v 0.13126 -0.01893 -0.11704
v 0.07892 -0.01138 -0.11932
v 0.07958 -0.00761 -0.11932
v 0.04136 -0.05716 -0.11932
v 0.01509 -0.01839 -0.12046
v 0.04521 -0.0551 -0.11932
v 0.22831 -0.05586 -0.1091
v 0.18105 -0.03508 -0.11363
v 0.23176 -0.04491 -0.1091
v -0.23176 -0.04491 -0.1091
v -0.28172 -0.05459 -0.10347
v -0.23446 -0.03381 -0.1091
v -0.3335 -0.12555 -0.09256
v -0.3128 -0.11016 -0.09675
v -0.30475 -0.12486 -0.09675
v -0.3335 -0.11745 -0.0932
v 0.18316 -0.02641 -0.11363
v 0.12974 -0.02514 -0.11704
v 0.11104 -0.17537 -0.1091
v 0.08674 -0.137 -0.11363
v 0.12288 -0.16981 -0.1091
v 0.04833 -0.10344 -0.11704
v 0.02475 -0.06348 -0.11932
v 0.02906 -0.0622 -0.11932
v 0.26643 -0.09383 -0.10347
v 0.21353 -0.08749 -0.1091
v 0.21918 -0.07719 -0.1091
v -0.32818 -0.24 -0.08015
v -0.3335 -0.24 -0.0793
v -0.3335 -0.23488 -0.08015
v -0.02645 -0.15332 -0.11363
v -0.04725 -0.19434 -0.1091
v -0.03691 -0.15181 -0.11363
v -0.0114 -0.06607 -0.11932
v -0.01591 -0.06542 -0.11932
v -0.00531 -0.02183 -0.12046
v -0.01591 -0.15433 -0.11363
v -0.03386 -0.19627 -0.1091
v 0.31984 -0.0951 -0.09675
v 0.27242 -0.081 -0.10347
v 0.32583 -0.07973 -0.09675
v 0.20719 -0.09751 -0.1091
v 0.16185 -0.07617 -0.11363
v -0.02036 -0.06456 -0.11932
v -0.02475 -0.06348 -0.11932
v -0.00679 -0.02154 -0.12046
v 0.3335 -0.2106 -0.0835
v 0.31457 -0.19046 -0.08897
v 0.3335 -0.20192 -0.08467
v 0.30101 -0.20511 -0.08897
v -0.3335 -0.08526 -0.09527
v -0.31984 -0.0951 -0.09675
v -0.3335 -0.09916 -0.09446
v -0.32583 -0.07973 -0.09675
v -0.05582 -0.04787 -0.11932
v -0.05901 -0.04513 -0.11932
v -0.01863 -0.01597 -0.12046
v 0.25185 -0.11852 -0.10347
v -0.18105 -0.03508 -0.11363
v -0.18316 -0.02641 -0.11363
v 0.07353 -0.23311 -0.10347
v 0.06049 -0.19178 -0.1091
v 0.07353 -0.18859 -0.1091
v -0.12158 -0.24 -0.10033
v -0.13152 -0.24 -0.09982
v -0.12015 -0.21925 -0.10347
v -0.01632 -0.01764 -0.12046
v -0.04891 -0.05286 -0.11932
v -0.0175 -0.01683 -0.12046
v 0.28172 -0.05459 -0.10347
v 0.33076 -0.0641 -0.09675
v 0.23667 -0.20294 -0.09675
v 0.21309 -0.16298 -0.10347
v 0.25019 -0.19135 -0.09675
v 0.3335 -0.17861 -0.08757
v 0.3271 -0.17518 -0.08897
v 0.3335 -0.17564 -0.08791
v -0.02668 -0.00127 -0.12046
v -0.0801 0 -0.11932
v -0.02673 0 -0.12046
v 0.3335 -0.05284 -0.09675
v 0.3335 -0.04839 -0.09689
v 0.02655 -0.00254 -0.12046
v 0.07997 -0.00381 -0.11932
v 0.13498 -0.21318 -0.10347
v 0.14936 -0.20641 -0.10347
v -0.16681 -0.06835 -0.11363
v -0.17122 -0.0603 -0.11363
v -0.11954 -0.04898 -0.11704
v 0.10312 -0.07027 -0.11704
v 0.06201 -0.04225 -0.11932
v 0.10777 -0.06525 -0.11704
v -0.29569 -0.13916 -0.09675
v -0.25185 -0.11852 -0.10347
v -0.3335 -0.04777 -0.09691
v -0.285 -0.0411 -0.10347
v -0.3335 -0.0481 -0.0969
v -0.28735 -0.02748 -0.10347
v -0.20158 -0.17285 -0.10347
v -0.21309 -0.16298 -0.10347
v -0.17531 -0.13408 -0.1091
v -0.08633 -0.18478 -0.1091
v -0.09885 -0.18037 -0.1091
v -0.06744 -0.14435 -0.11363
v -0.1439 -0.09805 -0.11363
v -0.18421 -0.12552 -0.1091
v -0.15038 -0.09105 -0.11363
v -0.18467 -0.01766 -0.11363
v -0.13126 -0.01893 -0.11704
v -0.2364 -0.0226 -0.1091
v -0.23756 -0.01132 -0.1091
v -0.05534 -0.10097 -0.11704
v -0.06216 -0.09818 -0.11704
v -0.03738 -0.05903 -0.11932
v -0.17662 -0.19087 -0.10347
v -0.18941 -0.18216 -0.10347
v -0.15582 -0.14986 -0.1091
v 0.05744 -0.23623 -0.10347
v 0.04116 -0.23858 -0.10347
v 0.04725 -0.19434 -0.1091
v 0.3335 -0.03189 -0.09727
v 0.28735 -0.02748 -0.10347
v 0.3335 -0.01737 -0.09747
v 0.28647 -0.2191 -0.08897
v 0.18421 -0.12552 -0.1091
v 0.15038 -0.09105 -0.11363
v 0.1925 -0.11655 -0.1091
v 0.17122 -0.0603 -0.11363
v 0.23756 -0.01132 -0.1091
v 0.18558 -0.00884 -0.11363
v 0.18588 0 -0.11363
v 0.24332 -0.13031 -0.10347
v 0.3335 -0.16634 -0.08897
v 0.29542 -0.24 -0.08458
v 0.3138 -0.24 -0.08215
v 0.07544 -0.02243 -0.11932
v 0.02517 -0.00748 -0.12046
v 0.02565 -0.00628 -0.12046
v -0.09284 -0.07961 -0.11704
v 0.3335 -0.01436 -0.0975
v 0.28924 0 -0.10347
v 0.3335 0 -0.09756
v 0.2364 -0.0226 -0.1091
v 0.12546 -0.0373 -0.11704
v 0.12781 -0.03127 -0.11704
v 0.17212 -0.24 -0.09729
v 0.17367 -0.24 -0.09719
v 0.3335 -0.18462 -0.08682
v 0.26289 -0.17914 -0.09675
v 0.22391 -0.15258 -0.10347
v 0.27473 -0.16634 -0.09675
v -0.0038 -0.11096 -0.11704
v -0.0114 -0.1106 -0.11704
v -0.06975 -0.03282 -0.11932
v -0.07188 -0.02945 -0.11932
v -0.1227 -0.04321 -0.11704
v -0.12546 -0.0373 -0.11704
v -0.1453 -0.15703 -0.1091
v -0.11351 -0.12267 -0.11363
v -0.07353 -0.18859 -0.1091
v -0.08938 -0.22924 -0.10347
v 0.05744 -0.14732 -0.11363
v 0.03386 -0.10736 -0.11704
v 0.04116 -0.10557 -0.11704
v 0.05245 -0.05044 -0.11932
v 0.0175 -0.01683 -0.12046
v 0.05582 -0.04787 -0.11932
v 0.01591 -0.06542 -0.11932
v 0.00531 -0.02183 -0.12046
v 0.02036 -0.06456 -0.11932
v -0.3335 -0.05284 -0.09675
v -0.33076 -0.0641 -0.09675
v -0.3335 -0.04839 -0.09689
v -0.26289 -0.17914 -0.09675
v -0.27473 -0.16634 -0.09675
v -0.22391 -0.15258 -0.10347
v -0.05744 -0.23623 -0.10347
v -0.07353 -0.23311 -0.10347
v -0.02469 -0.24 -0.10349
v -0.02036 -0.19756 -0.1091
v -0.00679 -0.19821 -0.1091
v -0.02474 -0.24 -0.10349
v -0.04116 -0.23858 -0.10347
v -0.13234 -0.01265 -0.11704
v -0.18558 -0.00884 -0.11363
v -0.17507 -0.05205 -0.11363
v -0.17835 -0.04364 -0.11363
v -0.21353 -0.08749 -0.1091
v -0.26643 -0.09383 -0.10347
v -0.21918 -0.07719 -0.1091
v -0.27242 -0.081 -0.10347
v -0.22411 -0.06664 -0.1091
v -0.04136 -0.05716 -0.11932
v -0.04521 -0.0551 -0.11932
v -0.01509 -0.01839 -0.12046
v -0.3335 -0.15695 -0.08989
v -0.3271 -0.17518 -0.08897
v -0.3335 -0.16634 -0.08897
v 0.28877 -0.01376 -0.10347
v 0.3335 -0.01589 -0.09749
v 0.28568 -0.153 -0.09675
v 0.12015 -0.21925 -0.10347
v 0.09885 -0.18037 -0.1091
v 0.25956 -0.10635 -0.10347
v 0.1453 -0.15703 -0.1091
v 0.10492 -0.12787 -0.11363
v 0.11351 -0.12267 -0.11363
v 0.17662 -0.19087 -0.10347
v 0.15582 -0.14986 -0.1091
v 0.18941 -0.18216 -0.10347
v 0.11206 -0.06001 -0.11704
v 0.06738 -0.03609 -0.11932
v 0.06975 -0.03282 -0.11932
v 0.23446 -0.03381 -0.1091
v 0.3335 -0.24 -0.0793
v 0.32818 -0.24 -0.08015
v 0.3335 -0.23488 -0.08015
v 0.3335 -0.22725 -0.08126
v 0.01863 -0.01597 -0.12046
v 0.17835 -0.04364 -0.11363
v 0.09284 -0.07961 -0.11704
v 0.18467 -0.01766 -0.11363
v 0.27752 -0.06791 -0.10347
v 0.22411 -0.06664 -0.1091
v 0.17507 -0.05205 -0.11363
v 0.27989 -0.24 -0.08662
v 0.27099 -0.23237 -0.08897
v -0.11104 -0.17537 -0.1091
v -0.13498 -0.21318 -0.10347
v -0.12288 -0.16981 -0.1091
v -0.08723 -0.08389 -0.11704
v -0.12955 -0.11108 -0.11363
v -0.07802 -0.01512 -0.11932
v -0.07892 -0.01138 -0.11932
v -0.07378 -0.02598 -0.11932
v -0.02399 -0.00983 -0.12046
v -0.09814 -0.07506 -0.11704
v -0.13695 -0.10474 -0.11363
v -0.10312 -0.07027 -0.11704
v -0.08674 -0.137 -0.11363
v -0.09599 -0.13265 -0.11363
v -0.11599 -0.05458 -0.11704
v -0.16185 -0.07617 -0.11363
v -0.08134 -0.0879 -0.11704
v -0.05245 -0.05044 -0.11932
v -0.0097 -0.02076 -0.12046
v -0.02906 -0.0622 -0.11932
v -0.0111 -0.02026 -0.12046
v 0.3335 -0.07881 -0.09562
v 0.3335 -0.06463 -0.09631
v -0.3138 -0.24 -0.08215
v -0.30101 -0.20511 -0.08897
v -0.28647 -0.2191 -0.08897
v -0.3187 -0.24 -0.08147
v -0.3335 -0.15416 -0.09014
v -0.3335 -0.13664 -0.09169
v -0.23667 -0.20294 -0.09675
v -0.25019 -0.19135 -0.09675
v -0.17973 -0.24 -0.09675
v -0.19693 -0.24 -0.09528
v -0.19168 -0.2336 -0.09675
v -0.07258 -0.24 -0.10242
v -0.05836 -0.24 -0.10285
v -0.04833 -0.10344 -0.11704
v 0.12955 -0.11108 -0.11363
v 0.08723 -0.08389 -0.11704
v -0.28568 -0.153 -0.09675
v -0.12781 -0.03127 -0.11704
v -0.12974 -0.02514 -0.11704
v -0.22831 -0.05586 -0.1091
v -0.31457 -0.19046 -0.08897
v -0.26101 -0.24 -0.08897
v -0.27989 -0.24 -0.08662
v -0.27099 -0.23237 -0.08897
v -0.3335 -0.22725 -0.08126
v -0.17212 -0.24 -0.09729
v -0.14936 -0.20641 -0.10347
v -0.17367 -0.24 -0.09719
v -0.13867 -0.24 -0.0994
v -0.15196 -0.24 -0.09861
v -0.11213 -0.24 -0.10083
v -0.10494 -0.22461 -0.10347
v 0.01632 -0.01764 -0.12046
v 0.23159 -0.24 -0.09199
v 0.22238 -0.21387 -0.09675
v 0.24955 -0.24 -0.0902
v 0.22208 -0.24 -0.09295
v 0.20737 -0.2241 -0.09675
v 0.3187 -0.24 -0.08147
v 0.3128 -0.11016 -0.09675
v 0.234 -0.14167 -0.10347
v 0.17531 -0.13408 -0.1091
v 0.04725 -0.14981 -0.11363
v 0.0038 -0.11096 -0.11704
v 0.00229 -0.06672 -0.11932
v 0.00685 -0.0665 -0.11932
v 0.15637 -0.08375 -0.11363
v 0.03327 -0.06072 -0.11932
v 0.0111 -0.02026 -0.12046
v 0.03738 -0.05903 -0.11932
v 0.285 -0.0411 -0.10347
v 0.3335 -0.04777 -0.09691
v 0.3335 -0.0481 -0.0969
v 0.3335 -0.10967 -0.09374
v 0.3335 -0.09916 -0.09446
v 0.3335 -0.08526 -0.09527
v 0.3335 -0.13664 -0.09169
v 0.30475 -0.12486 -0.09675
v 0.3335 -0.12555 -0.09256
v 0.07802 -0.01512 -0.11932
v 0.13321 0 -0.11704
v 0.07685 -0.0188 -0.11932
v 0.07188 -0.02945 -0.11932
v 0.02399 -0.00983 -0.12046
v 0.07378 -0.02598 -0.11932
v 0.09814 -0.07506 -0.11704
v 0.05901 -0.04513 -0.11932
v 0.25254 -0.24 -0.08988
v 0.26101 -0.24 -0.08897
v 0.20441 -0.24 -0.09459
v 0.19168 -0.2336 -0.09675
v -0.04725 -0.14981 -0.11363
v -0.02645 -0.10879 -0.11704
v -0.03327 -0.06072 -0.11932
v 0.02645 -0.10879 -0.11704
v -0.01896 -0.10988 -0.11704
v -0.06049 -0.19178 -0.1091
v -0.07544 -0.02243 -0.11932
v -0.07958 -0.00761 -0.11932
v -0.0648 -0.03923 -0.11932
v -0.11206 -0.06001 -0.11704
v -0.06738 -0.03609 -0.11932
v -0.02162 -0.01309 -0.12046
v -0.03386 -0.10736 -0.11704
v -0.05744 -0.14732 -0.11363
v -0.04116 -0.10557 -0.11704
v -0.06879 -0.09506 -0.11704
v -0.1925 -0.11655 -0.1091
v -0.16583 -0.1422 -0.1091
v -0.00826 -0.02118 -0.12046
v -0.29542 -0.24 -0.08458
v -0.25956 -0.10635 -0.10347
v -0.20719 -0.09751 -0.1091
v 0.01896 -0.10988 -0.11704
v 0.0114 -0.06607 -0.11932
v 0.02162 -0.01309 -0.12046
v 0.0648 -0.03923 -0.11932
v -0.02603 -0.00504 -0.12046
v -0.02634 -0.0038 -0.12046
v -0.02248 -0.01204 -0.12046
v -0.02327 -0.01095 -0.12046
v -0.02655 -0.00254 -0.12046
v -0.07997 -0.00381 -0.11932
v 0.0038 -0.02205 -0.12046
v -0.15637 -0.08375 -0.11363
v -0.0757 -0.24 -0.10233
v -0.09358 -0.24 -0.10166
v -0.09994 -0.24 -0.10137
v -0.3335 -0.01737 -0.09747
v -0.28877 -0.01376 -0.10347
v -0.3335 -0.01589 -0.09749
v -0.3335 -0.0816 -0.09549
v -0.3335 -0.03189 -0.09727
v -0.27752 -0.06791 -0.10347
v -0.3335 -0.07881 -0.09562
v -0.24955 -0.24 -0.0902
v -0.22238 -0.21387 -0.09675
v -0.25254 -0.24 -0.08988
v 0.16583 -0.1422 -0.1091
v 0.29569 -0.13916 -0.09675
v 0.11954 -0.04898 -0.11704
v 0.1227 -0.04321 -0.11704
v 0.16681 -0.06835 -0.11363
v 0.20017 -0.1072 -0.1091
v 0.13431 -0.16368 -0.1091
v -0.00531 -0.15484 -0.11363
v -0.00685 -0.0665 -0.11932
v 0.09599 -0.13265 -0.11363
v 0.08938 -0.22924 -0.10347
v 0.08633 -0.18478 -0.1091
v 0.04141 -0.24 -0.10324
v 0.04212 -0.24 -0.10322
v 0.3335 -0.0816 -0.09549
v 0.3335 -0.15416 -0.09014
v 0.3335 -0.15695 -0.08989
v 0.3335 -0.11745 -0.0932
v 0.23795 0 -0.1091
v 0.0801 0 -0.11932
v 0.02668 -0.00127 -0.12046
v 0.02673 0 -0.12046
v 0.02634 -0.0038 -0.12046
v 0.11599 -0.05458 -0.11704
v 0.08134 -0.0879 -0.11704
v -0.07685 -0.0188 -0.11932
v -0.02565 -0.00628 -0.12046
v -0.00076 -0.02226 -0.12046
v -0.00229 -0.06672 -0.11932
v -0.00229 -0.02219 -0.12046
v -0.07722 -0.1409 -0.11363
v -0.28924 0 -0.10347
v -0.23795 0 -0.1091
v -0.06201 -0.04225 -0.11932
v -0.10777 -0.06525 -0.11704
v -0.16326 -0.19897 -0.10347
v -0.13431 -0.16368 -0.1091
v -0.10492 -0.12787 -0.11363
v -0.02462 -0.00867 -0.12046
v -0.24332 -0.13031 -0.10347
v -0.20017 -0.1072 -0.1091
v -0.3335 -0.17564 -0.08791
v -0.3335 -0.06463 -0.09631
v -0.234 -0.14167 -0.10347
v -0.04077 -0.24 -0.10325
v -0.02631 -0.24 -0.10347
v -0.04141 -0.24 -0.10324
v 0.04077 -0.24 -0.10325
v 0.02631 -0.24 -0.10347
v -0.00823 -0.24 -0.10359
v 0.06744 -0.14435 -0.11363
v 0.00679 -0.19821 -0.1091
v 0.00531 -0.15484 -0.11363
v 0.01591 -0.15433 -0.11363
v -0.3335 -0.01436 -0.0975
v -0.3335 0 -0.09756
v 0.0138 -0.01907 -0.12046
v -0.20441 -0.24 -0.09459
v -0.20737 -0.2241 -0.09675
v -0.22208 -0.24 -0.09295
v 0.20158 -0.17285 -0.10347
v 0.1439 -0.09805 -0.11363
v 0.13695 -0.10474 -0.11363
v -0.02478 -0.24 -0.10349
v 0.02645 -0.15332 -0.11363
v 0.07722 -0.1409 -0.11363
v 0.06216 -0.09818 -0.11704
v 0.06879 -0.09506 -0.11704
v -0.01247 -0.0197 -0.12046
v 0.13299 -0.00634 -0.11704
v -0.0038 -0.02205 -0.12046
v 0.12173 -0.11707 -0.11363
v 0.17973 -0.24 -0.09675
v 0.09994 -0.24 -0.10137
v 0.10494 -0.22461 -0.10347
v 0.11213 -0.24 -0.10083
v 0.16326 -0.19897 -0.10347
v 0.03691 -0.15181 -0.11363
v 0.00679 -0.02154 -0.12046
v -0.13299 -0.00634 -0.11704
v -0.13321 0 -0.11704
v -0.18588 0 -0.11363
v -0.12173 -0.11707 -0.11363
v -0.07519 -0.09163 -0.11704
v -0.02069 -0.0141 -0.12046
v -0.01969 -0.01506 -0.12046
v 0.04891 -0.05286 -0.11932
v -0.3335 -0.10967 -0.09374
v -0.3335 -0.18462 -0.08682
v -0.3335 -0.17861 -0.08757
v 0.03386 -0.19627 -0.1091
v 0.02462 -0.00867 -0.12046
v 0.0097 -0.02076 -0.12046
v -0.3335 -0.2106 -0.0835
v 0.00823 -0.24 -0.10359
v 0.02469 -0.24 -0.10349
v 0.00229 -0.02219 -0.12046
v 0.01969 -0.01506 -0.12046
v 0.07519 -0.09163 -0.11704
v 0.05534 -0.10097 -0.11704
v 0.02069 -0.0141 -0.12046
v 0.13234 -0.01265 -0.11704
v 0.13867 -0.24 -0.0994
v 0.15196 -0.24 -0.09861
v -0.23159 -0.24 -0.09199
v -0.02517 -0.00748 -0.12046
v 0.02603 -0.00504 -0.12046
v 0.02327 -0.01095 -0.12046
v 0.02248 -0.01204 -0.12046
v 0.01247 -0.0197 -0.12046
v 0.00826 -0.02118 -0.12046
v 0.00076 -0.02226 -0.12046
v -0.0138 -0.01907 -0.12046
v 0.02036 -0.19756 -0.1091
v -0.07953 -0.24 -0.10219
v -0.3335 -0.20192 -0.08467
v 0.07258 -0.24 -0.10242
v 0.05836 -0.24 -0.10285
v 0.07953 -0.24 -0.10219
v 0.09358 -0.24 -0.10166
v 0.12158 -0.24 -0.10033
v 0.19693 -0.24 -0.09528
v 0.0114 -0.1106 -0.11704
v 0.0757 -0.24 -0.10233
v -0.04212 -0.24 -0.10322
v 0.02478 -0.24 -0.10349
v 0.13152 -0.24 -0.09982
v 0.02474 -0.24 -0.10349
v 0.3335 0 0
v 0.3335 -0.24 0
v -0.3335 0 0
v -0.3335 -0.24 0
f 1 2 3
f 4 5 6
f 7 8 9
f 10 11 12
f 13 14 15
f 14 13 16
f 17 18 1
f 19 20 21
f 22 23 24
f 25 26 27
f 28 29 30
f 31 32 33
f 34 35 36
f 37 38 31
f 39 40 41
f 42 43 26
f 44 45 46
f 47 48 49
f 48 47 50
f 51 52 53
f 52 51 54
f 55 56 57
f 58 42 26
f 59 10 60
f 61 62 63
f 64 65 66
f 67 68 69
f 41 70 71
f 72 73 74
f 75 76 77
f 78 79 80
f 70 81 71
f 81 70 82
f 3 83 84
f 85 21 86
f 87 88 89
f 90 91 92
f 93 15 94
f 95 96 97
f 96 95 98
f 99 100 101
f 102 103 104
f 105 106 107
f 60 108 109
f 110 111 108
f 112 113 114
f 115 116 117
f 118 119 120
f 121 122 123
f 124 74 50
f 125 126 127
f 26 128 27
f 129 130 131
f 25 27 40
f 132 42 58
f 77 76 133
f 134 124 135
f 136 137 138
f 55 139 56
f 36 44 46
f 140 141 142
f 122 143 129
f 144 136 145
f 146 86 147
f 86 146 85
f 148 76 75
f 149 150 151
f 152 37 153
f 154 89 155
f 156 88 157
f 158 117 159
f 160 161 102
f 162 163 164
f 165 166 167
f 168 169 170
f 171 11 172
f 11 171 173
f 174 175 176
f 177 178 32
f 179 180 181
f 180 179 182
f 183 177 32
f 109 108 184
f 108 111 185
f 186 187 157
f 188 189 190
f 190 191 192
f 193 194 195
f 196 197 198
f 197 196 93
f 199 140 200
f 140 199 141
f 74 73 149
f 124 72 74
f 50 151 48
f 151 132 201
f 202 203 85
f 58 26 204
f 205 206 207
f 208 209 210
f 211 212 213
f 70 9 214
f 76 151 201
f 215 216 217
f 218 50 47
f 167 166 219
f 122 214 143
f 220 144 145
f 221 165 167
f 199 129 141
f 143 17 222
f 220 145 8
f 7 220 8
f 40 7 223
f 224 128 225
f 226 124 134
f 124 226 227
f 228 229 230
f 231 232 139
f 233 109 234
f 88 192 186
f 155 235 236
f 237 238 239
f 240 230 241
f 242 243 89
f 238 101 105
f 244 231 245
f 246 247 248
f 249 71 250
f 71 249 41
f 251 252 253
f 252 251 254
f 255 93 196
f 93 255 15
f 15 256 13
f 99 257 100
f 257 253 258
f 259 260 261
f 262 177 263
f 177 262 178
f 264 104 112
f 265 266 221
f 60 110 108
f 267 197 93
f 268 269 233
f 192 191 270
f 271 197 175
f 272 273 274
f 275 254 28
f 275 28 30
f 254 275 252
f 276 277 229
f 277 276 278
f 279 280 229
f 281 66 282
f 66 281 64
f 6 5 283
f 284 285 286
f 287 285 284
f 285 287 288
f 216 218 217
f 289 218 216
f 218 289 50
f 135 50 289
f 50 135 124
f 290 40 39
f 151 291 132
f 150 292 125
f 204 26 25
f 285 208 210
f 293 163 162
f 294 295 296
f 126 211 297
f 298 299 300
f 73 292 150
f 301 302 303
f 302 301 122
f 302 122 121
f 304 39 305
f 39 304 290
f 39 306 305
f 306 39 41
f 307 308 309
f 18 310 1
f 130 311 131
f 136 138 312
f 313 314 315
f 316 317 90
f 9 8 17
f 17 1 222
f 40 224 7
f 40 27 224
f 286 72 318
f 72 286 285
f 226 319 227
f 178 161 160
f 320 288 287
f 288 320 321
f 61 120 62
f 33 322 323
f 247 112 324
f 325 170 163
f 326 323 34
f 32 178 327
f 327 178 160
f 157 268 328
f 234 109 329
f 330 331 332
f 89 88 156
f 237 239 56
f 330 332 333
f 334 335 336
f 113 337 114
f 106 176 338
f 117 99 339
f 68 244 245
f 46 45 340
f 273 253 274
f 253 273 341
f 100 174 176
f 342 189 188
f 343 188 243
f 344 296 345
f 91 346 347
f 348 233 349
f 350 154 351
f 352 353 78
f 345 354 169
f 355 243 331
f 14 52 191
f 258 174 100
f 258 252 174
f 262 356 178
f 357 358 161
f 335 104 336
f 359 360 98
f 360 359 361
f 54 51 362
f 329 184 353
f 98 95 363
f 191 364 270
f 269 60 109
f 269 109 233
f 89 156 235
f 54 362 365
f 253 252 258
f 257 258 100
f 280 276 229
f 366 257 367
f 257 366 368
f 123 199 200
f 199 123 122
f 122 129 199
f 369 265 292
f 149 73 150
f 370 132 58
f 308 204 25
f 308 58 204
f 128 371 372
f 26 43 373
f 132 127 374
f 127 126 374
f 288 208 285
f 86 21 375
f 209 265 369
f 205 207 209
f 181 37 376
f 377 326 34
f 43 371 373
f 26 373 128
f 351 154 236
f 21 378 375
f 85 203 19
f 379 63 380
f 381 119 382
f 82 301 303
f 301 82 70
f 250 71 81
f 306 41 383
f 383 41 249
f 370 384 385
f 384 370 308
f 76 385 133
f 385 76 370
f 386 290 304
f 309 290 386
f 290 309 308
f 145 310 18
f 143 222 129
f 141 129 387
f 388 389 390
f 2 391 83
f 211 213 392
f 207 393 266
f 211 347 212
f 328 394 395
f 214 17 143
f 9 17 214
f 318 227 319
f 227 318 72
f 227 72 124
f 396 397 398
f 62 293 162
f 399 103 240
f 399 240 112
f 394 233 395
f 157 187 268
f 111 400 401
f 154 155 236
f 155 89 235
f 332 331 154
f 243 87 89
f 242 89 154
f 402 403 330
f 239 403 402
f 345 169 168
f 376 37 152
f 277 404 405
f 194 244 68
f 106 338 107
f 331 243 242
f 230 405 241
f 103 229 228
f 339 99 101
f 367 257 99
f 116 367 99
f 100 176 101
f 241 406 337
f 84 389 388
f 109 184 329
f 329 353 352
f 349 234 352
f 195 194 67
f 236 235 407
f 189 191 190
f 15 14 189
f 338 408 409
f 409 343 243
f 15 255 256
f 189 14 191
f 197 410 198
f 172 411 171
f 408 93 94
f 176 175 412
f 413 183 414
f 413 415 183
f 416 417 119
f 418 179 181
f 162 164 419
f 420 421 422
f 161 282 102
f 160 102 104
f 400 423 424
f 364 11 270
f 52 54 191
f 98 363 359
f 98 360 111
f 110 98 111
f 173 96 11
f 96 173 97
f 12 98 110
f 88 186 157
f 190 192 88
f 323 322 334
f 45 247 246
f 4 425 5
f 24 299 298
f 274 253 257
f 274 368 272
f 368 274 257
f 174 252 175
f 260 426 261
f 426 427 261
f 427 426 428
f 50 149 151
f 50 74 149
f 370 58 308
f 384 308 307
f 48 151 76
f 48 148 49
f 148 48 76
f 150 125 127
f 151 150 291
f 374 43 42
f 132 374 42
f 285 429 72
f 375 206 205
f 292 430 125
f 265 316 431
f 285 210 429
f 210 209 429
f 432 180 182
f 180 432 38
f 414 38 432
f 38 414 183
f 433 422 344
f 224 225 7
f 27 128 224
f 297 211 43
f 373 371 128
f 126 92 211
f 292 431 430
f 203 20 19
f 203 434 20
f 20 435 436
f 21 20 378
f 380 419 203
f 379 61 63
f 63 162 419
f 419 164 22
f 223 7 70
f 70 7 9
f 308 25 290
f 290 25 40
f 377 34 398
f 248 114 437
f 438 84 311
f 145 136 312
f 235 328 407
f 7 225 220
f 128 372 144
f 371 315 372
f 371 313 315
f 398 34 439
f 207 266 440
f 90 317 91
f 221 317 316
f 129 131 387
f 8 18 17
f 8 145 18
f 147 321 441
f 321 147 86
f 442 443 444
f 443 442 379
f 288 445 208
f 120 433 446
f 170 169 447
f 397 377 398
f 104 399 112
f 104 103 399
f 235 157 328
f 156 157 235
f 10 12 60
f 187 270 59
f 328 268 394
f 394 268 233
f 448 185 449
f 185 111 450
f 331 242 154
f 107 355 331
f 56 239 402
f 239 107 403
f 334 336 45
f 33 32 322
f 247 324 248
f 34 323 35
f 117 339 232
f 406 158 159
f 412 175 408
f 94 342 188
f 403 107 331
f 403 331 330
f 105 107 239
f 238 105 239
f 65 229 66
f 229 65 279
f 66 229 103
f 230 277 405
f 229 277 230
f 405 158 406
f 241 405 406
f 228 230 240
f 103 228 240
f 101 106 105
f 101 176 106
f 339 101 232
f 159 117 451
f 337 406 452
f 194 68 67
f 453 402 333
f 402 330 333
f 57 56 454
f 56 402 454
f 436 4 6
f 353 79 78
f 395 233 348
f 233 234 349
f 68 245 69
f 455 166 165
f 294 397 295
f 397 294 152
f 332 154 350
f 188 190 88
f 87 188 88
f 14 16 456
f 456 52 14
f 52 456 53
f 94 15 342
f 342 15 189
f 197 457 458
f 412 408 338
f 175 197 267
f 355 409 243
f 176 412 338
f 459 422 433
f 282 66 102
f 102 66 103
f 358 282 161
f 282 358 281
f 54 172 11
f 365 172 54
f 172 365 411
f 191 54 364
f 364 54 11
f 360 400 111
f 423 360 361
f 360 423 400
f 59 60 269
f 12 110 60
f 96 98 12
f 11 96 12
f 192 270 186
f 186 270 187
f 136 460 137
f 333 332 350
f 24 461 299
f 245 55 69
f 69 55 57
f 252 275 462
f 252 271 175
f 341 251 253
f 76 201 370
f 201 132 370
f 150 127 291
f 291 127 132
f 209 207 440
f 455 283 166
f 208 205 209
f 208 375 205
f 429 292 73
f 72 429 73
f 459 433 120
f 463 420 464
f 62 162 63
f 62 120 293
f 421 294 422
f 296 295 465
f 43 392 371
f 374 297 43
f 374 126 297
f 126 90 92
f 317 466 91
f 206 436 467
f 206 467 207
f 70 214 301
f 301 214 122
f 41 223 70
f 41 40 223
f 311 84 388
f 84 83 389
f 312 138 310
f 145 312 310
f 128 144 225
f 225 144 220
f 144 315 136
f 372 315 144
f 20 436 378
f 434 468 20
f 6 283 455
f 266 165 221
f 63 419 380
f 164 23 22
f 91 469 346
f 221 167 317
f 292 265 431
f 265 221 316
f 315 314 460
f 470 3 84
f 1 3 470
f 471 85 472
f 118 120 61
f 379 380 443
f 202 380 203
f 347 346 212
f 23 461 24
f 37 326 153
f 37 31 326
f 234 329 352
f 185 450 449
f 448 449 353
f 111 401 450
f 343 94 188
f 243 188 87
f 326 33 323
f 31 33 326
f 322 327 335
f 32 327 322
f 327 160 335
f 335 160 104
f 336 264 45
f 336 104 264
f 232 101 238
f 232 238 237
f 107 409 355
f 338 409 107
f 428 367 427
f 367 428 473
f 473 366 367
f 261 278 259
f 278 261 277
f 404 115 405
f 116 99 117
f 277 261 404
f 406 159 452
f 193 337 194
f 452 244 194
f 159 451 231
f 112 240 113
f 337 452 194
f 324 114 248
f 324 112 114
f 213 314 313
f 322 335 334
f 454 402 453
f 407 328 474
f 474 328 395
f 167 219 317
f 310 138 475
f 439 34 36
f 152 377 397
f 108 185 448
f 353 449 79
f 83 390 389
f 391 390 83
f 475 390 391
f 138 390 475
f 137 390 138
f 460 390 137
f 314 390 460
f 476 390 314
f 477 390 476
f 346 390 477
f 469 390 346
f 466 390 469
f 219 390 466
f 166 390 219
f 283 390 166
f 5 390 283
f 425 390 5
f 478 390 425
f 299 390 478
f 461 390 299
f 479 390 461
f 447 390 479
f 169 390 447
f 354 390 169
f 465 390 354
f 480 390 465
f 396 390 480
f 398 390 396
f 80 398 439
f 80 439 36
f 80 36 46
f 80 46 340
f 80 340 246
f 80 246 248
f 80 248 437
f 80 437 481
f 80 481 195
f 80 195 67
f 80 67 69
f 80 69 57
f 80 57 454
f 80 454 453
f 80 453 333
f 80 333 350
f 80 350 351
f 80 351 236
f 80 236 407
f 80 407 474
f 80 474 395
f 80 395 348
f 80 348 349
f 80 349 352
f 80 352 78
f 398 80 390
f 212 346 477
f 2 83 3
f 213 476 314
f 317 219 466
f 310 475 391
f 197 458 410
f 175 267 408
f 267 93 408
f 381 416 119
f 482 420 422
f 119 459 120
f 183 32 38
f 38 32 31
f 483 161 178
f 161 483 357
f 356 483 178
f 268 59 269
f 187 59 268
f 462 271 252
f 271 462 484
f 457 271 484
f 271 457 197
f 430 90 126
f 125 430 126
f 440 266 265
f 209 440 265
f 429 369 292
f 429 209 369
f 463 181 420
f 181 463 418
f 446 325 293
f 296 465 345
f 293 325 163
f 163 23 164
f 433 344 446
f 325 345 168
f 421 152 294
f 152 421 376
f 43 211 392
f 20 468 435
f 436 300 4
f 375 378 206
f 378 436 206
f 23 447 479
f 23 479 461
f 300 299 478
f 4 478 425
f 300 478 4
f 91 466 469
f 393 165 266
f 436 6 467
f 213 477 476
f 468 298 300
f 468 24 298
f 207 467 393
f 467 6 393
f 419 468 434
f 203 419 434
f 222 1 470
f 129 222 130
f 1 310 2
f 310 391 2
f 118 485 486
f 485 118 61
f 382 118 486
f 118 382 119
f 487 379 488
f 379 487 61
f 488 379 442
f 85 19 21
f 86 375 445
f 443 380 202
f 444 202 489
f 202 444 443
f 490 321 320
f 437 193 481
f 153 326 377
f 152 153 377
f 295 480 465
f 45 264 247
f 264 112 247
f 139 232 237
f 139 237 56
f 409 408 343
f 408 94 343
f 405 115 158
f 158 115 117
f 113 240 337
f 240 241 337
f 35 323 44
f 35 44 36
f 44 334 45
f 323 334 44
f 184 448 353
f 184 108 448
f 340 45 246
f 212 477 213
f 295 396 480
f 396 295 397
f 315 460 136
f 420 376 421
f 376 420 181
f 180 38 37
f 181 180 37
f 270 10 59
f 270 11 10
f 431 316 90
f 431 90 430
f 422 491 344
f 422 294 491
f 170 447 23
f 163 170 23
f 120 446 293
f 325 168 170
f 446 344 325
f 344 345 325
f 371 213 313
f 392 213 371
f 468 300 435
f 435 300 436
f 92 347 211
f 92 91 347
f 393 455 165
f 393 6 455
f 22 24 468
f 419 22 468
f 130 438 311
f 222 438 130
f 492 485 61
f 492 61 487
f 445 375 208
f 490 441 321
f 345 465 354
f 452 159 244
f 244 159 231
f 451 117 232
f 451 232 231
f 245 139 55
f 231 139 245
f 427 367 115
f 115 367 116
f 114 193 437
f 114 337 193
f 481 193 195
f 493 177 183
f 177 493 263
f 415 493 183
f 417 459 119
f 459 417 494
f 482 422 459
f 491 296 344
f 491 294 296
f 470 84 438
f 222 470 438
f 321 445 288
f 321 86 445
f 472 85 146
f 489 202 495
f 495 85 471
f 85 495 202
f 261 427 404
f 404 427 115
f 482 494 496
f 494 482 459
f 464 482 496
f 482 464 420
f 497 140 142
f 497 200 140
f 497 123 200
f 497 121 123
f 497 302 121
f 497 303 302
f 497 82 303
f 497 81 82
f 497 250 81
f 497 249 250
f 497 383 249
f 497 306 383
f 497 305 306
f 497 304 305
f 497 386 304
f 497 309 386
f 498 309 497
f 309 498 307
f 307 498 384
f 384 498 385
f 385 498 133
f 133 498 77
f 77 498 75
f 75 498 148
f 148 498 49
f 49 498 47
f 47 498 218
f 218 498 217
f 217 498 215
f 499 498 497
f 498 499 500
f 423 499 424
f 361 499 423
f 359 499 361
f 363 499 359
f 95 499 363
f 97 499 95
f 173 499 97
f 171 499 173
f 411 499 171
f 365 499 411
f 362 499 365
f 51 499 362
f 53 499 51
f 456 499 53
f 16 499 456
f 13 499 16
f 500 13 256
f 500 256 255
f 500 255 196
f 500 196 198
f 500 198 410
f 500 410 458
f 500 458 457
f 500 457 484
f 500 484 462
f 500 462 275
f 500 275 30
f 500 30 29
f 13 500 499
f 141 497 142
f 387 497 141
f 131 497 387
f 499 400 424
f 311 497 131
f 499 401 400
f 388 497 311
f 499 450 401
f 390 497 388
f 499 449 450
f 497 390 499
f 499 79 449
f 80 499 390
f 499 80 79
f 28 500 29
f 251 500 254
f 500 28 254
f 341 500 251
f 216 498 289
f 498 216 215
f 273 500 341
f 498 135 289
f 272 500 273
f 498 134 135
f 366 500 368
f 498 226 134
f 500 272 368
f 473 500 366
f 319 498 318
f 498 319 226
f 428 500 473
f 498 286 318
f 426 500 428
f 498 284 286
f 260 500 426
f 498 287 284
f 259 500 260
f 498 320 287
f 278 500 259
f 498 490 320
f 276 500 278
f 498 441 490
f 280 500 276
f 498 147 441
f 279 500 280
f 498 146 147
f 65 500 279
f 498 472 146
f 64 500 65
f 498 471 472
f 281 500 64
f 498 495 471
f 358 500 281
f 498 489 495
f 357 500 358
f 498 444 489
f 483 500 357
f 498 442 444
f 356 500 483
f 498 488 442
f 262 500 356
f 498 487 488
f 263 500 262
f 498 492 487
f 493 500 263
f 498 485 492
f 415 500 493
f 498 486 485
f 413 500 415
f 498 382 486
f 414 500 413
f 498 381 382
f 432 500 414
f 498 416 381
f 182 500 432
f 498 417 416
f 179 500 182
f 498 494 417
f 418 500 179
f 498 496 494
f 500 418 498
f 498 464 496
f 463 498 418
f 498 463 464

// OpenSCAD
// =================================================================
// Bigfoot v3 single-piece foot generator
// =================================================================
//
// Coordinate convention:
//   +X = forward walking direction
//   +Y = robot-left / lateral
//   +Z = local vertical in the generated mesh
//
// curve_x/curve_y/curve_z are ellipsoid radii, not diameters.
// box_x is the centered forward footprint width: x in [-box_x/2, box_x/2].
// box_y is the per-side lateral footprint width:
//   left foot:  y in [0, box_y]
//   right foot: y in [-box_y, 0]
// box_z is the retained vertical slice height above the ellipsoid bottom.
//
// The ellipsoid bottom is placed at z=0, then the generated cap keeps
// z in [0, box_z] and is shifted down so the final top plane is z=0 and
// the curved bottom reaches down toward z=-box_z. For fixed box_z,
// increasing curve_z makes the retained ellipsoid slice flatter.

curve_x = 0.936;
curve_y = 0.78;
curve_z = 0.35;
box_x = 0.667;
box_y = 0.24;
box_z = 0.1206;
left_foot = 0; // 0 = right, 1 = left, 2 = both
fn = 110;

module ellipsoid_with_bottom_at_zero() {
    translate([0, 0, curve_z])
        scale([curve_x, curve_y, curve_z])
            sphere(r = 1, $fn = fn);
}

module half_foot_cap(side) {
    y_center = side == 1 ? box_y / 2 : -box_y / 2;

    translate([0, 0, -box_z])
        intersection() {
            ellipsoid_with_bottom_at_zero();

            // Centered forward bounds and one lateral cut through y=0.
            translate([0, y_center, box_z / 2])
                cube([box_x, box_y, box_z], center = true);
        }
}

if (left_foot == 1) {
    half_foot_cap(1);
} else if (left_foot == 2) {
    half_foot_cap(1);
    half_foot_cap(0);
} else {
    half_foot_cap(0);
}
